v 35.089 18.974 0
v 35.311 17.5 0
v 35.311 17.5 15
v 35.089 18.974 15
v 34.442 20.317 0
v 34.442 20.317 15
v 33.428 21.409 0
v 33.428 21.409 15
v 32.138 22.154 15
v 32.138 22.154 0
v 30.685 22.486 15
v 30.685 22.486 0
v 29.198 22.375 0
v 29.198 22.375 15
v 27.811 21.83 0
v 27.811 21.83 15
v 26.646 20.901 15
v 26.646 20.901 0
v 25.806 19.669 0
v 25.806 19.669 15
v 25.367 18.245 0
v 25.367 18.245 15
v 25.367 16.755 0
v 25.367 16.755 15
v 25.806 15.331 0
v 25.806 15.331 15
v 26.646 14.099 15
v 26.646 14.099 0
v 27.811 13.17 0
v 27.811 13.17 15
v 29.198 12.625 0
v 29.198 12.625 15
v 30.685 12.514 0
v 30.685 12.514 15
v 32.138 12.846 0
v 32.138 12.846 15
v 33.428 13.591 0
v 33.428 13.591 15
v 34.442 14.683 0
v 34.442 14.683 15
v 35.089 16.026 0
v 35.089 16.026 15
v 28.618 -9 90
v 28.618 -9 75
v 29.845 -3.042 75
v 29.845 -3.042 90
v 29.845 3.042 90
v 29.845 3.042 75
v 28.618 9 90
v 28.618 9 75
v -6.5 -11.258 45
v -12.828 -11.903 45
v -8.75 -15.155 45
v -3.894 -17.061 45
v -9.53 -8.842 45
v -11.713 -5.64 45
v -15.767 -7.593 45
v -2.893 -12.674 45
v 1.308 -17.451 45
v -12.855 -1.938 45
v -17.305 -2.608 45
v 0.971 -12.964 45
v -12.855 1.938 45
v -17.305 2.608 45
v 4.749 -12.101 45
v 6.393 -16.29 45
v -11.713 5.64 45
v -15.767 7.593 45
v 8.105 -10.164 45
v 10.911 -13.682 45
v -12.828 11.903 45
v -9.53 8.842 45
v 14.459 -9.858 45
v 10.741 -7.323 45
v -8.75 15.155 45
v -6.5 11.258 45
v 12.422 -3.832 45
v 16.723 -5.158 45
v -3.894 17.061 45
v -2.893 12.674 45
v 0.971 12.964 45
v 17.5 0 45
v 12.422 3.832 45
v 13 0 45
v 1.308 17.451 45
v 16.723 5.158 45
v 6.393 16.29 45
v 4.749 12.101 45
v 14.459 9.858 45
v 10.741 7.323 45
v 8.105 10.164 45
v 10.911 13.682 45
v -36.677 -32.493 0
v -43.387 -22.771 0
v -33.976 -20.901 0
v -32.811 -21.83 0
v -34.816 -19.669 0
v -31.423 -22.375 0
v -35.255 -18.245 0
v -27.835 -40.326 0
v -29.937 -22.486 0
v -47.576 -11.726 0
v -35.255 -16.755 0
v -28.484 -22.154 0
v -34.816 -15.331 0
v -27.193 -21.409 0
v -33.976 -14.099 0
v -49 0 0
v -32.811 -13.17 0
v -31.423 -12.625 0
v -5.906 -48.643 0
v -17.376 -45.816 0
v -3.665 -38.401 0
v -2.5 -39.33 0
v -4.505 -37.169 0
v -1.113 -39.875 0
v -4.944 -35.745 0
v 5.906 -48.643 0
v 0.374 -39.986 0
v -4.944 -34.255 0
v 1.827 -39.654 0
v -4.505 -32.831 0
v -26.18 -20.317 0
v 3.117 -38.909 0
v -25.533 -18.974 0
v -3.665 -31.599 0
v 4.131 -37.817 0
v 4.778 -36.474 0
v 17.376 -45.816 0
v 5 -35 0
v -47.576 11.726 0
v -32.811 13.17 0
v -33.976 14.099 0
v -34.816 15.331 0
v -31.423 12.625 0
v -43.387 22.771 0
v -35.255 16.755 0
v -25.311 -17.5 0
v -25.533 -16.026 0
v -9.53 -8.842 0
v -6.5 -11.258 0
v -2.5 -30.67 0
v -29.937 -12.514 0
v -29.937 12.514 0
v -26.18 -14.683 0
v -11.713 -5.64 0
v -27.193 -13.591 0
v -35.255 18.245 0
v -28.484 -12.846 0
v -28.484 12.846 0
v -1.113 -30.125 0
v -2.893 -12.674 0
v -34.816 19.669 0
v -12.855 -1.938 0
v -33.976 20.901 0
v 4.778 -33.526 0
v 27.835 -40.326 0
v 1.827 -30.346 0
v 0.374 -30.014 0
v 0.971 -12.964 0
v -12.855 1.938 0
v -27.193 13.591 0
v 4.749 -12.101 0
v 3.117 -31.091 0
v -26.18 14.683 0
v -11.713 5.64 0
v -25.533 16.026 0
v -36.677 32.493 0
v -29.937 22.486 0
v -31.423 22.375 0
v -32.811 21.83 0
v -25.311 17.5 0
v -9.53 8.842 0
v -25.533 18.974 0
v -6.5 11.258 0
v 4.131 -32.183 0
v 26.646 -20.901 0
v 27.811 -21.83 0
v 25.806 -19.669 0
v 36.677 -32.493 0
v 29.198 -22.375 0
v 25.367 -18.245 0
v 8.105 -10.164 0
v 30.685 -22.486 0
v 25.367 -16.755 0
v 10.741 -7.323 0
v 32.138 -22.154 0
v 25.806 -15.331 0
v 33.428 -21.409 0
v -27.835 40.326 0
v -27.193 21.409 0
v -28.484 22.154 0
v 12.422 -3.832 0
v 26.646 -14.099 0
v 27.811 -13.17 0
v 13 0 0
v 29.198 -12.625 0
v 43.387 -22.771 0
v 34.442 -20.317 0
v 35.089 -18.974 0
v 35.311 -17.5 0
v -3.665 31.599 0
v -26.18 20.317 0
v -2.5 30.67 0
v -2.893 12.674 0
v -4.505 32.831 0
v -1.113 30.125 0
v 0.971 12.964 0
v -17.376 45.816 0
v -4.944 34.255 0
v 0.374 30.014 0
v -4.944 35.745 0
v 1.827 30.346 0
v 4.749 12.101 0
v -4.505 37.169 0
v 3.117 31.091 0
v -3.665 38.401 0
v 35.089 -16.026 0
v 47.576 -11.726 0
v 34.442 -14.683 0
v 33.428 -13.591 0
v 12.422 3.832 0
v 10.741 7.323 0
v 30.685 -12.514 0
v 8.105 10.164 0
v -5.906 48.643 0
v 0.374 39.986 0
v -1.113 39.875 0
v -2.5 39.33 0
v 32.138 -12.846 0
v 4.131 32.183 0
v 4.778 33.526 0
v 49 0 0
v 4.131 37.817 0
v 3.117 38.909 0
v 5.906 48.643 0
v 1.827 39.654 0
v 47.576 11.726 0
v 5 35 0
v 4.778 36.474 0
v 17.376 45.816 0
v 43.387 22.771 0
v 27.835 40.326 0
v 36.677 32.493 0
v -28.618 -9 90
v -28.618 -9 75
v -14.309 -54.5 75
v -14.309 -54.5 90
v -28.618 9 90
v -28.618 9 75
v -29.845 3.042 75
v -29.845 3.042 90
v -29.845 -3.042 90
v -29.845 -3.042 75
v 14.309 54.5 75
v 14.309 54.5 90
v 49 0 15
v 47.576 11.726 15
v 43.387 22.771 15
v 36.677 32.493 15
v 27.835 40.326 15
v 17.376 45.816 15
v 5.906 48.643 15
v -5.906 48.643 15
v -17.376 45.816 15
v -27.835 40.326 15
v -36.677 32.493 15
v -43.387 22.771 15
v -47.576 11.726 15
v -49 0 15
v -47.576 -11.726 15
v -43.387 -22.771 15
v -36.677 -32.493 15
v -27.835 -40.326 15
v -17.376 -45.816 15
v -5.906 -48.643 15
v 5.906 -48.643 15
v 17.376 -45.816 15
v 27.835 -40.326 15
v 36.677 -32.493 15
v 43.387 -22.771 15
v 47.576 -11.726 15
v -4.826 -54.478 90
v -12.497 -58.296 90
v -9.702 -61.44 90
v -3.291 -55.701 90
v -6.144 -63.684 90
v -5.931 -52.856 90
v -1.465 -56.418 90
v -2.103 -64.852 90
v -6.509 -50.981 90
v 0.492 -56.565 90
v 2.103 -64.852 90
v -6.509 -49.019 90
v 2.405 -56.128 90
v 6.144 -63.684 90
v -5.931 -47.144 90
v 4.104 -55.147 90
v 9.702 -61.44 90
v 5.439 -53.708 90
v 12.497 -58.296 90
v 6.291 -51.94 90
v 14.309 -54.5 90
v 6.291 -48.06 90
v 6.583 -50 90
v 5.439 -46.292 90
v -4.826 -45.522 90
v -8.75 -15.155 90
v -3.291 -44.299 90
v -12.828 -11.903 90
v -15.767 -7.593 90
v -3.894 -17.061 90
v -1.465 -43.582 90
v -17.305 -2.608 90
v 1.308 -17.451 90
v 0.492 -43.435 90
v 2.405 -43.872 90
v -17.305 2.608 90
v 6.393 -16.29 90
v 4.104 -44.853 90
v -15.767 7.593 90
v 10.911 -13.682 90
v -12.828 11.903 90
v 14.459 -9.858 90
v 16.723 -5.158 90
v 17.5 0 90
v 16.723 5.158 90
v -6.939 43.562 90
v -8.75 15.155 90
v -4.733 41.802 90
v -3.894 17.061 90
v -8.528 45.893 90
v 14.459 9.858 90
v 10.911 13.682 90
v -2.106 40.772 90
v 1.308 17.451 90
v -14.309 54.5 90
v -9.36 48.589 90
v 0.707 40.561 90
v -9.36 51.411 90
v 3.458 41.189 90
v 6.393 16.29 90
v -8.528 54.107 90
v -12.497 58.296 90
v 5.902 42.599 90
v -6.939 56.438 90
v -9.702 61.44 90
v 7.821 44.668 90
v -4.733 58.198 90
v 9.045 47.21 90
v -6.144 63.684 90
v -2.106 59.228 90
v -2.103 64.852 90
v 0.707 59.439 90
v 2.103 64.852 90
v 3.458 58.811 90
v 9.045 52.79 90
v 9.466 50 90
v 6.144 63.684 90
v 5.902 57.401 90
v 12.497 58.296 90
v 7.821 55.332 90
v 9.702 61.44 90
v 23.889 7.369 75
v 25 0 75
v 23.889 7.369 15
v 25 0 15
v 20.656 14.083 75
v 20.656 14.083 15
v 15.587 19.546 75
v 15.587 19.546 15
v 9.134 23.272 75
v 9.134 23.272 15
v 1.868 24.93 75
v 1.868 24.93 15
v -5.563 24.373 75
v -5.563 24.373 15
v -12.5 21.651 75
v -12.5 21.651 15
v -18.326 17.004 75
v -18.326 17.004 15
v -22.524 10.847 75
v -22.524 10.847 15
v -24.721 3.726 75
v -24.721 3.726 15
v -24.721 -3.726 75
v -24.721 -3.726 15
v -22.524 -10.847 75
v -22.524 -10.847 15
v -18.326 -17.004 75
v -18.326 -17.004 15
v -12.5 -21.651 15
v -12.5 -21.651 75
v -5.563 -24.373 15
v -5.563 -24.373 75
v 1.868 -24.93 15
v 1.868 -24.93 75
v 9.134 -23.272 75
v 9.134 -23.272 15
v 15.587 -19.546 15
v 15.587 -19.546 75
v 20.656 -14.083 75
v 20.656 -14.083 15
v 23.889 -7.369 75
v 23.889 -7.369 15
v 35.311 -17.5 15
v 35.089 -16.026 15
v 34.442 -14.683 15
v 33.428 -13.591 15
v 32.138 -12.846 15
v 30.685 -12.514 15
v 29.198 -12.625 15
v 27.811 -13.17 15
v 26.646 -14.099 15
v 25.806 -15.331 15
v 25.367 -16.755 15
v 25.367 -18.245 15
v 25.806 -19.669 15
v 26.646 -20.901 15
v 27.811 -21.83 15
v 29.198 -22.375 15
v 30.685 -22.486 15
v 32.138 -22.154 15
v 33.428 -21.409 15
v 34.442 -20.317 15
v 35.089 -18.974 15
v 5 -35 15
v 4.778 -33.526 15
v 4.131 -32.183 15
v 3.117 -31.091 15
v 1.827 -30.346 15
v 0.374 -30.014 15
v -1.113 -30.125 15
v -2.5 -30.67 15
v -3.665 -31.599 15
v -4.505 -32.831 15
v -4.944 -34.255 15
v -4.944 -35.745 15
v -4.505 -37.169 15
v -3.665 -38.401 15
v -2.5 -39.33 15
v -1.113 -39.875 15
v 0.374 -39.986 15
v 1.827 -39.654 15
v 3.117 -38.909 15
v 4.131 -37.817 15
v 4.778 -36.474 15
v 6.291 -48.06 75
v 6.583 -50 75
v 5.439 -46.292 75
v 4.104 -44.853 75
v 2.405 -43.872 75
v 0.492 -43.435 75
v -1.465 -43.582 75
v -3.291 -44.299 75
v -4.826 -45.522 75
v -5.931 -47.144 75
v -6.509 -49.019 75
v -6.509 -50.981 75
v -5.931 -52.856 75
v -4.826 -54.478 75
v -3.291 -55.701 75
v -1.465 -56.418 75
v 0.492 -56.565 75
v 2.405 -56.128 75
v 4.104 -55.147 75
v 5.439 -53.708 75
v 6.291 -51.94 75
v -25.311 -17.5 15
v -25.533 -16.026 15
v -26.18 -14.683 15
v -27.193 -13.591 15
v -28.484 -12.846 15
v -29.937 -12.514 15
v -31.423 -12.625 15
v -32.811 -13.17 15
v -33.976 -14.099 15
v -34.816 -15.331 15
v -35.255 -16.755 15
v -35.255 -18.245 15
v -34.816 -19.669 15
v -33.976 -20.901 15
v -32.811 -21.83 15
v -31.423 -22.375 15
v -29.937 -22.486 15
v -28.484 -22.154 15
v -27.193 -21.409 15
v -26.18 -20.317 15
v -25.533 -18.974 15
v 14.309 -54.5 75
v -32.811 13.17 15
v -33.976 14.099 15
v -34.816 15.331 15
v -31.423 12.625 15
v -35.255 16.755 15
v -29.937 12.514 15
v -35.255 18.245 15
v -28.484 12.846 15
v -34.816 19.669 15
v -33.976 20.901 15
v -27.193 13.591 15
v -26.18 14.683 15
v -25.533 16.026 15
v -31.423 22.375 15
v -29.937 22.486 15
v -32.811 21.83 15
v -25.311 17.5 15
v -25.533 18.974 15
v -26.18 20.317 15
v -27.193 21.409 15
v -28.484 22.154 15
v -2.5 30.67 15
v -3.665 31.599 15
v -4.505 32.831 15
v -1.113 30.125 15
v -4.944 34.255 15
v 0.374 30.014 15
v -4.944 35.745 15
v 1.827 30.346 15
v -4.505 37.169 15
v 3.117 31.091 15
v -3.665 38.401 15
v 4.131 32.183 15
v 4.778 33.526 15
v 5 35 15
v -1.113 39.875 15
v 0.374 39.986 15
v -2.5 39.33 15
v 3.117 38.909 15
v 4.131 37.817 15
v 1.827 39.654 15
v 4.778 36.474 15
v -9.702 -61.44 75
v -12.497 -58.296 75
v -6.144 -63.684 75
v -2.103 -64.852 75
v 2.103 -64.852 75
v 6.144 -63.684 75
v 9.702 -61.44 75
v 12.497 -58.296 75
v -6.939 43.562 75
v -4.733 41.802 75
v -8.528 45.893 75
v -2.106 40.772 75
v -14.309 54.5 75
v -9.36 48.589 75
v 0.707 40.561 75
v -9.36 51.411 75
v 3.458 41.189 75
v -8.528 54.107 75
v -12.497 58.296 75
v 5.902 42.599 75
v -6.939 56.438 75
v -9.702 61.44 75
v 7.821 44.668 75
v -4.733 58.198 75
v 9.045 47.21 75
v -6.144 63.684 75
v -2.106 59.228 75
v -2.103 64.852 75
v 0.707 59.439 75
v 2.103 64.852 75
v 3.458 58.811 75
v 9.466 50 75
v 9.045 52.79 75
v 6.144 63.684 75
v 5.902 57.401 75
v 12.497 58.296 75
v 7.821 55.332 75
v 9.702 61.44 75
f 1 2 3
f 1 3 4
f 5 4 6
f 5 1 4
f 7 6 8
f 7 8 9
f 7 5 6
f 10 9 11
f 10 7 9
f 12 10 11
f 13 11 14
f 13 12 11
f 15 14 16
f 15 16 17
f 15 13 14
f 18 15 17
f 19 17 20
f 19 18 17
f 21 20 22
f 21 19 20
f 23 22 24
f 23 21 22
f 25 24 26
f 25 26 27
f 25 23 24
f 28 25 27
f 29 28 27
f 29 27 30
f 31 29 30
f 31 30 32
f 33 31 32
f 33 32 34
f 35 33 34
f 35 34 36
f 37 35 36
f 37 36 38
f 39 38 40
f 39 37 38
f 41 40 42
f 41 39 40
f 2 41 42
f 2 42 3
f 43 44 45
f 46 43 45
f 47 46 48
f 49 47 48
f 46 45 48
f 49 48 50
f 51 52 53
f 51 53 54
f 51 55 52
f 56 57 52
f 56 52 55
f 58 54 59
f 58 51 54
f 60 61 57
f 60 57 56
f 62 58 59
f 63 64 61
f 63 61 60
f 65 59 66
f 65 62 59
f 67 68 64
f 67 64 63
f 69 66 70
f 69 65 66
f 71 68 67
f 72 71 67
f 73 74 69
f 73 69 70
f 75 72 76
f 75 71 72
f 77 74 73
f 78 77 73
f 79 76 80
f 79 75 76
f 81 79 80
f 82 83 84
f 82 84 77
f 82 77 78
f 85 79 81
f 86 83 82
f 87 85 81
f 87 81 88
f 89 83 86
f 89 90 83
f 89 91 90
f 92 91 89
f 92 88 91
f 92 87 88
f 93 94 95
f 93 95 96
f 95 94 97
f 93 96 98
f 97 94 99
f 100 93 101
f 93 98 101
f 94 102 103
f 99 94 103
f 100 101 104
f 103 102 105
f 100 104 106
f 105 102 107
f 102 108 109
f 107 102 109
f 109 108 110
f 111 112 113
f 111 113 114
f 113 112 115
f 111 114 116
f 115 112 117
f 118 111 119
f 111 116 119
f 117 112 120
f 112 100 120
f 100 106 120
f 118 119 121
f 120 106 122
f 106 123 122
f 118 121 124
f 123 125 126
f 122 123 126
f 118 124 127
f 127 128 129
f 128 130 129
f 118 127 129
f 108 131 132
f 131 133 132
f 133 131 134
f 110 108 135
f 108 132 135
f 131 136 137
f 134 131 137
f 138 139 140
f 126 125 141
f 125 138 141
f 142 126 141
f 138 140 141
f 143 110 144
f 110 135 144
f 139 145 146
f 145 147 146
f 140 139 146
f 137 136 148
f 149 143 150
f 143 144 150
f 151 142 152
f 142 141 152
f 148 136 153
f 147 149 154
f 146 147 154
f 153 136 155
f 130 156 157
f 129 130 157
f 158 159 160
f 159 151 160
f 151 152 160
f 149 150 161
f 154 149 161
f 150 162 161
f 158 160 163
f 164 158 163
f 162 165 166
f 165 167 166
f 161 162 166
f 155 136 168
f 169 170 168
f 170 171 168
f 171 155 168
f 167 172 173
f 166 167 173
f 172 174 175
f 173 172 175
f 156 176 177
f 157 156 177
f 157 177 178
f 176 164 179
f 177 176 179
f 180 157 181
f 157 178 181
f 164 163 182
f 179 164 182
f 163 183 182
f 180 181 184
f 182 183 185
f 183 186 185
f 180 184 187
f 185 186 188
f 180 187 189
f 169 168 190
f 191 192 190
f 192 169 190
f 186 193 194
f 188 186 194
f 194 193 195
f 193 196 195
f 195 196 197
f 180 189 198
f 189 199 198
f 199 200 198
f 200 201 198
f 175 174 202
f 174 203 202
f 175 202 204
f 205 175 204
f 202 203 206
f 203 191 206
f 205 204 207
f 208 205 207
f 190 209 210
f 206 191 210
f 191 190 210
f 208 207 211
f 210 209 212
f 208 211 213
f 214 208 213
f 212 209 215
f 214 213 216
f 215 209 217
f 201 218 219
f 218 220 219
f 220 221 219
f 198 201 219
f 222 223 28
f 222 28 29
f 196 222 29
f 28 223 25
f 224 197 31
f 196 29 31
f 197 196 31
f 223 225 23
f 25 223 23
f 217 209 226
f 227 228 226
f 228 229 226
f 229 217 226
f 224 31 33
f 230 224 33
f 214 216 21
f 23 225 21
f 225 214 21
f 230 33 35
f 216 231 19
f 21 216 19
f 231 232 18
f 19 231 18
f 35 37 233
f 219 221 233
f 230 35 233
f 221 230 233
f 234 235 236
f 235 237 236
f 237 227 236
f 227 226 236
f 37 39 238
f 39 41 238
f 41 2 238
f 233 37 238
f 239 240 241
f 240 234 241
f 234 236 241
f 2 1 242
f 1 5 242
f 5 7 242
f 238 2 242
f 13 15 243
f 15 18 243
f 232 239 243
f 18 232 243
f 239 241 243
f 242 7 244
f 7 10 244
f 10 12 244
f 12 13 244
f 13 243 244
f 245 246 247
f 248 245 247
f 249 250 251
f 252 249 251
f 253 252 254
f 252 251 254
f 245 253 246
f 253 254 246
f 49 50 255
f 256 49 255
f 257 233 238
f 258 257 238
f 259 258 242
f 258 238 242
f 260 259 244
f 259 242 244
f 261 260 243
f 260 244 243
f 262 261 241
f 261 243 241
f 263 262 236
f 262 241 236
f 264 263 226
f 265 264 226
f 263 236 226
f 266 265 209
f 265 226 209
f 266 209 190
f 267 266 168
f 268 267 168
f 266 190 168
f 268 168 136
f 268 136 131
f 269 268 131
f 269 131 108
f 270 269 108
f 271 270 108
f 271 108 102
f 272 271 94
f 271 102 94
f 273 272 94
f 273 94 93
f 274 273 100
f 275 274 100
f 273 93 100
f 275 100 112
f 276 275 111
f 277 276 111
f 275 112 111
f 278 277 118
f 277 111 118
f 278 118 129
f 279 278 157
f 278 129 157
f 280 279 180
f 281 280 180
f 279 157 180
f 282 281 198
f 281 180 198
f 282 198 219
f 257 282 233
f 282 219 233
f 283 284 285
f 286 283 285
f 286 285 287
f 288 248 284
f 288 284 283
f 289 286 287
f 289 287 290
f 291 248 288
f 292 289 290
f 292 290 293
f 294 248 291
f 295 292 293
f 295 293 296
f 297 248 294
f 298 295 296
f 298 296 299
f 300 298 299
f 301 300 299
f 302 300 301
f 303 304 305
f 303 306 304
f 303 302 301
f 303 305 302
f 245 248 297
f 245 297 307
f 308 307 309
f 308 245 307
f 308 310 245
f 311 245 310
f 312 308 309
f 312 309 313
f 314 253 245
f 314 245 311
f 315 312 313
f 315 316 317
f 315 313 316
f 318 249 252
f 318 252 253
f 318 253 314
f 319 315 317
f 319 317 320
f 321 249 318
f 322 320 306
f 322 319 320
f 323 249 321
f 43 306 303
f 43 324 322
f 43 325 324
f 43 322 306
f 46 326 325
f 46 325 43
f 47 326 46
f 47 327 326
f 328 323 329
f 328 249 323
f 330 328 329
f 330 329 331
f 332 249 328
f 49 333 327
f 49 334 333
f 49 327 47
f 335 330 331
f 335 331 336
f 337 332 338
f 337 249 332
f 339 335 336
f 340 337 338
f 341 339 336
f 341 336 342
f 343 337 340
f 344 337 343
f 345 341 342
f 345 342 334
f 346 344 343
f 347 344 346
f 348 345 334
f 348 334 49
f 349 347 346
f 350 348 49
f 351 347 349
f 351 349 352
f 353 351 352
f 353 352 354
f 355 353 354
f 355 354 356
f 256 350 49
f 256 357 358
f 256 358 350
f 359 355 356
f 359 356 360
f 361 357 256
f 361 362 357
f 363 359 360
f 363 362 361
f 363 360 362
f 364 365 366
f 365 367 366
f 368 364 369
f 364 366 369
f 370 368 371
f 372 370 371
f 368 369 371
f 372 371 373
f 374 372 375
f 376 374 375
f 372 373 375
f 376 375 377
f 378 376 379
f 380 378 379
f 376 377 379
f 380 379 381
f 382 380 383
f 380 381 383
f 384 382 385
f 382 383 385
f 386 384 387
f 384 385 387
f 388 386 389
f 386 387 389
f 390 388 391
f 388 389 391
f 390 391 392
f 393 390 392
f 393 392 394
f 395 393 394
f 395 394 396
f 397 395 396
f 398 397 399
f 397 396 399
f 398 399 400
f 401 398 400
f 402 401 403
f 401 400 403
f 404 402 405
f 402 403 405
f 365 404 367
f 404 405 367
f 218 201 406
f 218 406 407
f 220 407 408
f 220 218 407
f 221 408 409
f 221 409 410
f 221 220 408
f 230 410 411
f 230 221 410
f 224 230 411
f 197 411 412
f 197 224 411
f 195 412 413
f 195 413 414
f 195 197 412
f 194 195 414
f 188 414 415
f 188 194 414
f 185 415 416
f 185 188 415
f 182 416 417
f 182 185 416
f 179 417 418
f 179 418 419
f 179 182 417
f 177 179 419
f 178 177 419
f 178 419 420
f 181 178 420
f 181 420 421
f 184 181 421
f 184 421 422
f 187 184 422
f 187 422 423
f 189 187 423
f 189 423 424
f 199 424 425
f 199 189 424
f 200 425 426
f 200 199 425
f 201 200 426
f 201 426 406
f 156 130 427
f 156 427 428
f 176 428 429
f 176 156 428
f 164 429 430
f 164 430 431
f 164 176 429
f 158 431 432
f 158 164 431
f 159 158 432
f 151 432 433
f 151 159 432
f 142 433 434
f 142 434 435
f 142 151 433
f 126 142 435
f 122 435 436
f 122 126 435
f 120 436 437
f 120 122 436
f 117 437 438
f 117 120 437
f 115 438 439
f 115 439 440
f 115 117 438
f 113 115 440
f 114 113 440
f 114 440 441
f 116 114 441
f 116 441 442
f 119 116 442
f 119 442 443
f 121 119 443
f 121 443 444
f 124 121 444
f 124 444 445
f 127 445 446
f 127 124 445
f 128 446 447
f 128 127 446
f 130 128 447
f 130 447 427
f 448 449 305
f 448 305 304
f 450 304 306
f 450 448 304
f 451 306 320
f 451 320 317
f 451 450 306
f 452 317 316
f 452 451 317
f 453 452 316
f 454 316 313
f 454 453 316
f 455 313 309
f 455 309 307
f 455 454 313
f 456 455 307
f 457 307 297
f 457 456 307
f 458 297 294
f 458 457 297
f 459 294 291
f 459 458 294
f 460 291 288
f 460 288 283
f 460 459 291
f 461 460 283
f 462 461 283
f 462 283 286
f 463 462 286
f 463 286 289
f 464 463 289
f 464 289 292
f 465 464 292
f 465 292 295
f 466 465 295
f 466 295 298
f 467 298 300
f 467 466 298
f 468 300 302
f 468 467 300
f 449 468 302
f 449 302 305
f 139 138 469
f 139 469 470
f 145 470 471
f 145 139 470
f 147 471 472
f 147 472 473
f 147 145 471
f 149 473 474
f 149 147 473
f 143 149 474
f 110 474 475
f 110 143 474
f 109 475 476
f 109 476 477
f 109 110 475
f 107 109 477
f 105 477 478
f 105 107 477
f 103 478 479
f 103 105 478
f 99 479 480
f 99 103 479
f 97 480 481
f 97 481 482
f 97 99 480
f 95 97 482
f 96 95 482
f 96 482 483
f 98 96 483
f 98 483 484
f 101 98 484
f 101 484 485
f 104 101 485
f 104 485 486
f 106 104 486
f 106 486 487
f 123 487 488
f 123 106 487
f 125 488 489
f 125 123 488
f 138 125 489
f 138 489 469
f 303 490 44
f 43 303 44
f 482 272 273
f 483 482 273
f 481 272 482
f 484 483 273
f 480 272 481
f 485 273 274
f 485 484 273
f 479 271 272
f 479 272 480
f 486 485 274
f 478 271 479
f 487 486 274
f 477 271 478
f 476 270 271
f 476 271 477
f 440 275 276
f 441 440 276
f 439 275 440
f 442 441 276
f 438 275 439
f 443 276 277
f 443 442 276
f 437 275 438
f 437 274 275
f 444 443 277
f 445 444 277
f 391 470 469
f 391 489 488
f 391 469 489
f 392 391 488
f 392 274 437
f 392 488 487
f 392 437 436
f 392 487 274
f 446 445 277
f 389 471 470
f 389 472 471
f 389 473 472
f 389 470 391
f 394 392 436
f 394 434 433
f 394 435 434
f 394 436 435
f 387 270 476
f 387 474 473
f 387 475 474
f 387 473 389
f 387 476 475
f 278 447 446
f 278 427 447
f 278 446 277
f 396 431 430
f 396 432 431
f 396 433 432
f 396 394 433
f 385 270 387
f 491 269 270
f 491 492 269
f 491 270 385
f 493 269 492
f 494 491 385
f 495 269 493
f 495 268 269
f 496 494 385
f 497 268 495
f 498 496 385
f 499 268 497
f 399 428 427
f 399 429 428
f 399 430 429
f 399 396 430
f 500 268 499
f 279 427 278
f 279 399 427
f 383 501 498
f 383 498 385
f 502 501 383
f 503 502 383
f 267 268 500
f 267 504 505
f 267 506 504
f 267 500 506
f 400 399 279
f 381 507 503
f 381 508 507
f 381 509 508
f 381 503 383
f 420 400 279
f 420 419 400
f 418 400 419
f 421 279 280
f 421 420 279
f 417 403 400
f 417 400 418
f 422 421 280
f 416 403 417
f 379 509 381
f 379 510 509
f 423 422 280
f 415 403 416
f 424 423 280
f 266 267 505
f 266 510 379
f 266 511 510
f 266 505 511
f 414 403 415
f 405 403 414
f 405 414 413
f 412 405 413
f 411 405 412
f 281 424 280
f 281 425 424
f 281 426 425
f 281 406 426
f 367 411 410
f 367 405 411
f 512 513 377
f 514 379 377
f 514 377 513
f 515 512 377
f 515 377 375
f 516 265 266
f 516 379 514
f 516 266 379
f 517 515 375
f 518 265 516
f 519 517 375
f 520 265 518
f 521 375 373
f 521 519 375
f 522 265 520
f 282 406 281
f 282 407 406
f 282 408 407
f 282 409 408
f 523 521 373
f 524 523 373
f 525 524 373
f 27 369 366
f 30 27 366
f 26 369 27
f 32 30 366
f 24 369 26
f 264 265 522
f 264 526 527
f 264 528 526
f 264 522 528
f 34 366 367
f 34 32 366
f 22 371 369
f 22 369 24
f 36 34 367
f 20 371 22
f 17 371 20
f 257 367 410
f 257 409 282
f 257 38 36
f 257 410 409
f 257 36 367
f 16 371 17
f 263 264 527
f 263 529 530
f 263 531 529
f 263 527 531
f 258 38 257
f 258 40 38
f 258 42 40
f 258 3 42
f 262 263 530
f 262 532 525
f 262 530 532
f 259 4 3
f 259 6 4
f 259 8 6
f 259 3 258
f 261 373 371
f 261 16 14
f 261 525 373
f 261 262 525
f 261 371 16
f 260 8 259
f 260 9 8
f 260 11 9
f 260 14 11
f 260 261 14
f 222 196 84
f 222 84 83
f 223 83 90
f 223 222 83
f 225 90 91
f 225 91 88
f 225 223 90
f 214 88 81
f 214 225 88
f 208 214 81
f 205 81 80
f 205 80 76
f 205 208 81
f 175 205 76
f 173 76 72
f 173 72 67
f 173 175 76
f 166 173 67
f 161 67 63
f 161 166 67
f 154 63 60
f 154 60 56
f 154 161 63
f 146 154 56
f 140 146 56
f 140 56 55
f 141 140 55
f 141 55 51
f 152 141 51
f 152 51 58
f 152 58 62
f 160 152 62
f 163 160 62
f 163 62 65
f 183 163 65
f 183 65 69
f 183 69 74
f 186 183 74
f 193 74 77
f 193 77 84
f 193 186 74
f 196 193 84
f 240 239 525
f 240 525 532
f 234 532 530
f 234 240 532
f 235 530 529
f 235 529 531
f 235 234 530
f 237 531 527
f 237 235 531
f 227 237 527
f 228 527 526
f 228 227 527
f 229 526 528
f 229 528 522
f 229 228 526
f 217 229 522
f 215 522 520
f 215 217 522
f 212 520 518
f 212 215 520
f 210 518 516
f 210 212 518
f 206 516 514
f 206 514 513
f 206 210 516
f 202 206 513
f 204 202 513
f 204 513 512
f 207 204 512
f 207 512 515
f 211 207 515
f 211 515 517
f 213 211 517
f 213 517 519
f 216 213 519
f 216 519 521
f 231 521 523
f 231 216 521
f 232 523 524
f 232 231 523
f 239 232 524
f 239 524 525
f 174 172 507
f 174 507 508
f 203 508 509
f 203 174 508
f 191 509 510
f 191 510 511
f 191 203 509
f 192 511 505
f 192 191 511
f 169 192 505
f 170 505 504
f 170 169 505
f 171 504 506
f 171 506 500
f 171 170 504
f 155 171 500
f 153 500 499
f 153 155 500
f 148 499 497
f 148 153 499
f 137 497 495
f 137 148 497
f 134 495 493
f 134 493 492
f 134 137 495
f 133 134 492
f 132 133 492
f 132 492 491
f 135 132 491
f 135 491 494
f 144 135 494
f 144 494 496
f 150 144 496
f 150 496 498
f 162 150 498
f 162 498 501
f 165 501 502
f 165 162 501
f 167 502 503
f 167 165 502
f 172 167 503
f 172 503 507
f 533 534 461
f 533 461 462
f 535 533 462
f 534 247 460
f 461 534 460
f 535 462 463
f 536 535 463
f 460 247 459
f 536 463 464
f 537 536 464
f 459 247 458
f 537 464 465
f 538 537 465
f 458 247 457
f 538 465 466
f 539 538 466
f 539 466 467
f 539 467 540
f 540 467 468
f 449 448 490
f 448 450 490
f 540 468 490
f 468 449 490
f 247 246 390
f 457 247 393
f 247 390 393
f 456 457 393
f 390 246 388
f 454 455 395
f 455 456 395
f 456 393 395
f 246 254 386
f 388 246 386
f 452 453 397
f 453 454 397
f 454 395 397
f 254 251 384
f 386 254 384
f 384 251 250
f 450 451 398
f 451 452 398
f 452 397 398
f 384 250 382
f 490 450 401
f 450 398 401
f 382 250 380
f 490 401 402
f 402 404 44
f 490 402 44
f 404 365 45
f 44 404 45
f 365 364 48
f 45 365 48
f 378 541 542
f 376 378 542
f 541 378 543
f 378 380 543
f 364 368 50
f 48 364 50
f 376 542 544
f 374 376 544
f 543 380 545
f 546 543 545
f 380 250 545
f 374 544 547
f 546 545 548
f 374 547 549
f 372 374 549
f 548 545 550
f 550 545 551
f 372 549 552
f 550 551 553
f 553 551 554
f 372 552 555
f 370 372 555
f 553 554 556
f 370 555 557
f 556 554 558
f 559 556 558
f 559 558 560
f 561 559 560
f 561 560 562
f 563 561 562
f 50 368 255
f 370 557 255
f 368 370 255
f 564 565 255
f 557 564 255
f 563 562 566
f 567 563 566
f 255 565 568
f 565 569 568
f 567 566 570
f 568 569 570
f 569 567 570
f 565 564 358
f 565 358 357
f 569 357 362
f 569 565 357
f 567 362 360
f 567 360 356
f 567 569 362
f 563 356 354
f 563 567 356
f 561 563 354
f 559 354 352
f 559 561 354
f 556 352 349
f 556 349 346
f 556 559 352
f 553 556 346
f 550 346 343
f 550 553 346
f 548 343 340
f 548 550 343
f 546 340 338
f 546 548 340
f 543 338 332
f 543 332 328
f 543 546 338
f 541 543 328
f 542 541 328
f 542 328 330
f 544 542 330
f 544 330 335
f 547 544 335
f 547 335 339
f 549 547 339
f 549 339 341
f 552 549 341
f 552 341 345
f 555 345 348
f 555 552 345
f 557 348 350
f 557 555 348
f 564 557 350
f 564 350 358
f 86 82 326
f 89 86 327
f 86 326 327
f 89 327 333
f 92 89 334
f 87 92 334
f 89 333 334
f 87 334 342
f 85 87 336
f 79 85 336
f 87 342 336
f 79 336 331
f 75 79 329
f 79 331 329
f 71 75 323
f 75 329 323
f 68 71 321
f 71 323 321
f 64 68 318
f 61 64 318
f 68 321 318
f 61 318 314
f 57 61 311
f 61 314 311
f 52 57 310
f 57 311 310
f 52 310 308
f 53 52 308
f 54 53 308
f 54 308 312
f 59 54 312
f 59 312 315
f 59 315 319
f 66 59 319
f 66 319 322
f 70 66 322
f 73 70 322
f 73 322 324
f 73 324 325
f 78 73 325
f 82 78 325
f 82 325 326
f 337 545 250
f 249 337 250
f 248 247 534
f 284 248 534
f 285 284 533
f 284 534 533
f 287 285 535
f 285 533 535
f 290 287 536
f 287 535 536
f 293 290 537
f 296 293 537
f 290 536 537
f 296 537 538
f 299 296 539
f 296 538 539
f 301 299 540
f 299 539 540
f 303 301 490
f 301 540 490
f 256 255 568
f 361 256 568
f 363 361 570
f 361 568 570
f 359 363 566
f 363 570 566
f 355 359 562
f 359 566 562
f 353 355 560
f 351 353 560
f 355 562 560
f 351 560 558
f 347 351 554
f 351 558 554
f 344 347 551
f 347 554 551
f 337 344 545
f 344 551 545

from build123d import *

# Parameters (mm, degrees)
SKETCH1_R           = 49
SKETCH1_R_2         = 5
SKETCH1_R_3         = 25
BOSS_EXTRUDE1_DEPTH = 15
SKETCH2_R           = 25
SKETCH2_R_2         = 13
BOSS_EXTRUDE2_DEPTH = 45
SKETCH3_R           = 25
SKETCH3_R_2         = 17.5
BOSS_EXTRUDE3_DEPTH = 30
SKETCH5_R           = 6.582974729
SKETCH5_R_2         = 9.465771496
BOSS_EXTRUDE5_DEPTH = 15
SKETCH6_R           = 17.5
CUT_EXTRUDE1_DEPTH  = 15


with BuildPart() as part:
    # Sketch1 → Boss-Extrude1 (new body)
    with BuildSketch(Plane.XY):
        Circle(SKETCH1_R)
        with Locations((0, 35)):
            Circle(SKETCH1_R_2, mode=Mode.SUBTRACT)
        with Locations((-30.310889132, 17.5)):
            Circle(SKETCH1_R_2, mode=Mode.SUBTRACT)
        with Locations((30.310889132, 17.5)):
            Circle(SKETCH1_R_2, mode=Mode.SUBTRACT)
        with Locations((30.310889132, -17.5)):
            Circle(SKETCH1_R_2, mode=Mode.SUBTRACT)
        with Locations((0, -35)):
            Circle(SKETCH1_R_2, mode=Mode.SUBTRACT)
        with Locations((-30.310889132, -17.5)):
            Circle(SKETCH1_R_2, mode=Mode.SUBTRACT)
        Circle(SKETCH1_R_3, mode=Mode.SUBTRACT)
    extrude(amount=BOSS_EXTRUDE1_DEPTH)

    # Sketch2 → Boss-Extrude2 (add)
    with BuildSketch(Plane.XY):
        Circle(SKETCH2_R)
        Circle(SKETCH2_R_2, mode=Mode.SUBTRACT)
    extrude(amount=BOSS_EXTRUDE2_DEPTH)

    # Sketch3 → Boss-Extrude3 (add)
    with BuildSketch(Plane.XY.offset(45)):
        Circle(SKETCH3_R)
        Circle(SKETCH3_R_2, mode=Mode.SUBTRACT)
    extrude(amount=BOSS_EXTRUDE3_DEPTH)

    # Sketch5 → Boss-Extrude5 (add)
    with BuildSketch(Plane.XY.offset(75)):
        with BuildLine():
            Line((14.309088021, -54.5), (28.618175978, -9.000000204))
            ThreePointArc((28.618175978, -9.000000204), (30, 3.7e-08), (28.618175956, 9.000000276))
            Line((28.618175956, 9.000000276), (14.309088021, 54.5))
            ThreePointArc((14.309088021, 54.5), (0, 65), (-14.309088021, 54.5))
            Line((-14.309088021, 54.5), (-28.618175825, 9.000000693))
            ThreePointArc((-28.618175825, 9.000000693), (-30, 2.3e-08), (-28.618175838, -9.000000649))
            Line((-28.618175838, -9.000000649), (-14.309088021, -54.5))
            ThreePointArc((-14.309088021, -54.5), (0, -65), (14.309088021, -54.5))
        make_face()
        with Locations((0, -50)):
            Circle(SKETCH5_R, mode=Mode.SUBTRACT)
        with Locations((0, 50)):
            Circle(SKETCH5_R_2, mode=Mode.SUBTRACT)
    extrude(amount=BOSS_EXTRUDE5_DEPTH)

    # Sketch6 → Cut-Extrude1 (cut)
    with BuildSketch(Plane.XY.offset(90)):
        Circle(SKETCH6_R)
    extrude(amount=-CUT_EXTRUDE1_DEPTH, mode=Mode.SUBTRACT)


solid = part.part
